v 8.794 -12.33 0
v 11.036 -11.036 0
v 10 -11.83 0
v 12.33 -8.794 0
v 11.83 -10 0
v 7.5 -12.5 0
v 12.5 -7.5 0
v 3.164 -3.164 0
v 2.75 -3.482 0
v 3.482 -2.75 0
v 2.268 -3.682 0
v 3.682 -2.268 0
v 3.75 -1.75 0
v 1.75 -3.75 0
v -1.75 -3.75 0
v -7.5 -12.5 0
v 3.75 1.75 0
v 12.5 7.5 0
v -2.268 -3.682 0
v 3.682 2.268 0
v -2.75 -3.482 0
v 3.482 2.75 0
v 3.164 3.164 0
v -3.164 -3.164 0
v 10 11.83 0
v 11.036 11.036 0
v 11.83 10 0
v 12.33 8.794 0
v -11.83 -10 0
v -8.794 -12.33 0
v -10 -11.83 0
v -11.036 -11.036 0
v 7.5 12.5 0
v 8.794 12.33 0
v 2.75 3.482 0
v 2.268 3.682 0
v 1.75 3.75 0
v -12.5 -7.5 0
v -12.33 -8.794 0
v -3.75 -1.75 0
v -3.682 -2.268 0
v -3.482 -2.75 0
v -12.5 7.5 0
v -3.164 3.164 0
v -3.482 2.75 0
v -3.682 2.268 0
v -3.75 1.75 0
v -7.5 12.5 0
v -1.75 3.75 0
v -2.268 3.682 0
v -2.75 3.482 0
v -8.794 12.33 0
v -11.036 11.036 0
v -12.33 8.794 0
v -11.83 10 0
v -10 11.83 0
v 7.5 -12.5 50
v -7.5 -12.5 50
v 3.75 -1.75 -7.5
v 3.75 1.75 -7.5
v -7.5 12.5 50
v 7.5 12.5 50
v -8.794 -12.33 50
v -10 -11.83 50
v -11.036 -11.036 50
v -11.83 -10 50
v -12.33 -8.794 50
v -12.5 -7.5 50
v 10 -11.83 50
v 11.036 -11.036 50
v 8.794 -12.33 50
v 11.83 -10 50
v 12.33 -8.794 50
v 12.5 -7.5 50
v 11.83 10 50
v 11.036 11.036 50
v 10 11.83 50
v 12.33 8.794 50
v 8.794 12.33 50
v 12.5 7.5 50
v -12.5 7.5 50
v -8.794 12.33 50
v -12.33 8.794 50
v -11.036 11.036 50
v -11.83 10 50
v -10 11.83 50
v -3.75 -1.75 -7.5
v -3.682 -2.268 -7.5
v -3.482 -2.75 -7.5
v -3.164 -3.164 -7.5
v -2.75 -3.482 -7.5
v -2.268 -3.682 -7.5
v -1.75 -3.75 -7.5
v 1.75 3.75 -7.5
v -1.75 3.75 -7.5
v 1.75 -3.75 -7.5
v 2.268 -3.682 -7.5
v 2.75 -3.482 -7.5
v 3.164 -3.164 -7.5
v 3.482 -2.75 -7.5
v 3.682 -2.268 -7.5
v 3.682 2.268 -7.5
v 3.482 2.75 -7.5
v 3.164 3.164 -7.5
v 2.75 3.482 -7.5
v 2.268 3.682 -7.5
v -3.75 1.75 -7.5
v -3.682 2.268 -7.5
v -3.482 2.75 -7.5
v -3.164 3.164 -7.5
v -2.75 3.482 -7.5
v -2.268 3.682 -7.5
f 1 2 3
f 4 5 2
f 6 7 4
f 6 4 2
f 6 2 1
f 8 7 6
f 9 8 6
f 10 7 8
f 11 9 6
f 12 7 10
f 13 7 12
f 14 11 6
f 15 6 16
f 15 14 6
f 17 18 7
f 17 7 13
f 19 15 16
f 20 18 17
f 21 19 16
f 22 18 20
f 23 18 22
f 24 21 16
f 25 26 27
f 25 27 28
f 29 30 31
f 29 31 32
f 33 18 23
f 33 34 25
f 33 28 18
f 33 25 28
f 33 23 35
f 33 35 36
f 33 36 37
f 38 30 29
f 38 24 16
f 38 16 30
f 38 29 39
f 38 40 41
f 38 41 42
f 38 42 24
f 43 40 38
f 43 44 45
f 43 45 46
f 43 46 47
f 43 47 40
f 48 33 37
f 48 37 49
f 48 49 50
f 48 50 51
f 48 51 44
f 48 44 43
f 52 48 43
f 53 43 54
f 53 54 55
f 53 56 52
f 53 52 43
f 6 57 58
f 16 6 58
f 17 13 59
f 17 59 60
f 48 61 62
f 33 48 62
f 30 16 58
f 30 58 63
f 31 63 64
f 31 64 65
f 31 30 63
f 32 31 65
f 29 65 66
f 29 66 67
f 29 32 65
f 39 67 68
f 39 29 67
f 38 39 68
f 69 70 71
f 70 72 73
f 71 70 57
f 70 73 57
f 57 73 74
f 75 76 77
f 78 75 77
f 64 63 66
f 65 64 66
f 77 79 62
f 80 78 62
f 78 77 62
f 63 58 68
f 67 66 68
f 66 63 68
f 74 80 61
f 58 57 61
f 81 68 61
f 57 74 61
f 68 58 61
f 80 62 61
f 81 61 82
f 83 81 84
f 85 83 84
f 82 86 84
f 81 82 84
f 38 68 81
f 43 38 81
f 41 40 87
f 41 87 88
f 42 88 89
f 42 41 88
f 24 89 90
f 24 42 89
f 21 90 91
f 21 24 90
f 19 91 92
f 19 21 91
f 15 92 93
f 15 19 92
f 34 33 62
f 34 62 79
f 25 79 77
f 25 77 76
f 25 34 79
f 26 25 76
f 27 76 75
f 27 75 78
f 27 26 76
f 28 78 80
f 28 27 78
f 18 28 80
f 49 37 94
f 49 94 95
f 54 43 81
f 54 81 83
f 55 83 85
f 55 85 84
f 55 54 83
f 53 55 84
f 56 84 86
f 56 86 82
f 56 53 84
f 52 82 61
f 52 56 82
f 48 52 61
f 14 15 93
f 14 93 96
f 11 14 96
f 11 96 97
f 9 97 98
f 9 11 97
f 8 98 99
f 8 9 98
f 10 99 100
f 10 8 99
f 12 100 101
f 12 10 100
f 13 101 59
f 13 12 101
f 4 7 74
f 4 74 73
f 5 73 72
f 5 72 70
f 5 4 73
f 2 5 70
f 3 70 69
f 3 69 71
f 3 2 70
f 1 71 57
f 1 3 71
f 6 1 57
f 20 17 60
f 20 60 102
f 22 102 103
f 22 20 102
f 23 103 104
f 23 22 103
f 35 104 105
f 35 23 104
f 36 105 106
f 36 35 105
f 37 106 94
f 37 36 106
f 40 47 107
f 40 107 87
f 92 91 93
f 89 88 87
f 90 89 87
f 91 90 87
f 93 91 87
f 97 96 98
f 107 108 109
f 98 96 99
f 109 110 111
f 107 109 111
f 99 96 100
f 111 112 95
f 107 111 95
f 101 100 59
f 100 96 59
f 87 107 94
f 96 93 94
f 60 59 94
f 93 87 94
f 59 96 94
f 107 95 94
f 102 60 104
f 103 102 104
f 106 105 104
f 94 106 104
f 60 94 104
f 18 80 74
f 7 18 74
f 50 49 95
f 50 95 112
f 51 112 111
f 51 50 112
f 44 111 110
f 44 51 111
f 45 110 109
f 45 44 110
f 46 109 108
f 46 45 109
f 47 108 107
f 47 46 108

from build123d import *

# Parameters (mm, degrees)
Y_KSEKLIK_EKSTR_ZYON1_DEPTH = 50
Y_KSEKLIK_EKSTR_ZYON2_DEPTH = 7.5


with BuildPart() as part:
    # Çizim1 → Yükseklik-Ekstrüzyon1 (new body)
    with BuildSketch(Plane.XY):
        with BuildLine():
            Line((-7.5, 12.5), (7.5, 12.5))
            ThreePointArc((7.5, 12.5), (11.035533906, 11.035533906), (12.5, 7.5))
            Line((12.5, 7.5), (12.5, -7.5))
            ThreePointArc((12.5, -7.5), (11.035533906, -11.035533906), (7.5, -12.5))
            Line((7.5, -12.5), (-7.5, -12.5))
            ThreePointArc((-7.5, -12.5), (-11.035533906, -11.035533906), (-12.5, -7.5))
            Line((-12.5, -7.5), (-12.5, 7.5))
            ThreePointArc((-12.5, 7.5), (-11.035533906, 11.035533906), (-7.5, 12.5))
        make_face()
    extrude(amount=Y_KSEKLIK_EKSTR_ZYON1_DEPTH)

    # Çizim2 → Yükseklik-Ekstrüzyon2 (add)
    with BuildSketch(Plane.XY):
        with BuildLine():
            Line((1.75, 3.75), (-1.75, 3.75))
            ThreePointArc((-1.75, 3.75), (-3.164213562, 3.164213562), (-3.75, 1.75))
            Line((-3.75, 1.75), (-3.75, -1.75))
            ThreePointArc((-3.75, -1.75), (-3.164213562, -3.164213562), (-1.75, -3.75))
            Line((-1.75, -3.75), (1.75, -3.75))
            ThreePointArc((1.75, -3.75), (3.164213562, -3.164213562), (3.75, -1.75))
            Line((3.75, -1.75), (3.75, 1.75))
            ThreePointArc((3.75, 1.75), (3.164213562, 3.164213562), (1.75, 3.75))
        make_face()
    extrude(amount=-Y_KSEKLIK_EKSTR_ZYON2_DEPTH)


solid = part.part
